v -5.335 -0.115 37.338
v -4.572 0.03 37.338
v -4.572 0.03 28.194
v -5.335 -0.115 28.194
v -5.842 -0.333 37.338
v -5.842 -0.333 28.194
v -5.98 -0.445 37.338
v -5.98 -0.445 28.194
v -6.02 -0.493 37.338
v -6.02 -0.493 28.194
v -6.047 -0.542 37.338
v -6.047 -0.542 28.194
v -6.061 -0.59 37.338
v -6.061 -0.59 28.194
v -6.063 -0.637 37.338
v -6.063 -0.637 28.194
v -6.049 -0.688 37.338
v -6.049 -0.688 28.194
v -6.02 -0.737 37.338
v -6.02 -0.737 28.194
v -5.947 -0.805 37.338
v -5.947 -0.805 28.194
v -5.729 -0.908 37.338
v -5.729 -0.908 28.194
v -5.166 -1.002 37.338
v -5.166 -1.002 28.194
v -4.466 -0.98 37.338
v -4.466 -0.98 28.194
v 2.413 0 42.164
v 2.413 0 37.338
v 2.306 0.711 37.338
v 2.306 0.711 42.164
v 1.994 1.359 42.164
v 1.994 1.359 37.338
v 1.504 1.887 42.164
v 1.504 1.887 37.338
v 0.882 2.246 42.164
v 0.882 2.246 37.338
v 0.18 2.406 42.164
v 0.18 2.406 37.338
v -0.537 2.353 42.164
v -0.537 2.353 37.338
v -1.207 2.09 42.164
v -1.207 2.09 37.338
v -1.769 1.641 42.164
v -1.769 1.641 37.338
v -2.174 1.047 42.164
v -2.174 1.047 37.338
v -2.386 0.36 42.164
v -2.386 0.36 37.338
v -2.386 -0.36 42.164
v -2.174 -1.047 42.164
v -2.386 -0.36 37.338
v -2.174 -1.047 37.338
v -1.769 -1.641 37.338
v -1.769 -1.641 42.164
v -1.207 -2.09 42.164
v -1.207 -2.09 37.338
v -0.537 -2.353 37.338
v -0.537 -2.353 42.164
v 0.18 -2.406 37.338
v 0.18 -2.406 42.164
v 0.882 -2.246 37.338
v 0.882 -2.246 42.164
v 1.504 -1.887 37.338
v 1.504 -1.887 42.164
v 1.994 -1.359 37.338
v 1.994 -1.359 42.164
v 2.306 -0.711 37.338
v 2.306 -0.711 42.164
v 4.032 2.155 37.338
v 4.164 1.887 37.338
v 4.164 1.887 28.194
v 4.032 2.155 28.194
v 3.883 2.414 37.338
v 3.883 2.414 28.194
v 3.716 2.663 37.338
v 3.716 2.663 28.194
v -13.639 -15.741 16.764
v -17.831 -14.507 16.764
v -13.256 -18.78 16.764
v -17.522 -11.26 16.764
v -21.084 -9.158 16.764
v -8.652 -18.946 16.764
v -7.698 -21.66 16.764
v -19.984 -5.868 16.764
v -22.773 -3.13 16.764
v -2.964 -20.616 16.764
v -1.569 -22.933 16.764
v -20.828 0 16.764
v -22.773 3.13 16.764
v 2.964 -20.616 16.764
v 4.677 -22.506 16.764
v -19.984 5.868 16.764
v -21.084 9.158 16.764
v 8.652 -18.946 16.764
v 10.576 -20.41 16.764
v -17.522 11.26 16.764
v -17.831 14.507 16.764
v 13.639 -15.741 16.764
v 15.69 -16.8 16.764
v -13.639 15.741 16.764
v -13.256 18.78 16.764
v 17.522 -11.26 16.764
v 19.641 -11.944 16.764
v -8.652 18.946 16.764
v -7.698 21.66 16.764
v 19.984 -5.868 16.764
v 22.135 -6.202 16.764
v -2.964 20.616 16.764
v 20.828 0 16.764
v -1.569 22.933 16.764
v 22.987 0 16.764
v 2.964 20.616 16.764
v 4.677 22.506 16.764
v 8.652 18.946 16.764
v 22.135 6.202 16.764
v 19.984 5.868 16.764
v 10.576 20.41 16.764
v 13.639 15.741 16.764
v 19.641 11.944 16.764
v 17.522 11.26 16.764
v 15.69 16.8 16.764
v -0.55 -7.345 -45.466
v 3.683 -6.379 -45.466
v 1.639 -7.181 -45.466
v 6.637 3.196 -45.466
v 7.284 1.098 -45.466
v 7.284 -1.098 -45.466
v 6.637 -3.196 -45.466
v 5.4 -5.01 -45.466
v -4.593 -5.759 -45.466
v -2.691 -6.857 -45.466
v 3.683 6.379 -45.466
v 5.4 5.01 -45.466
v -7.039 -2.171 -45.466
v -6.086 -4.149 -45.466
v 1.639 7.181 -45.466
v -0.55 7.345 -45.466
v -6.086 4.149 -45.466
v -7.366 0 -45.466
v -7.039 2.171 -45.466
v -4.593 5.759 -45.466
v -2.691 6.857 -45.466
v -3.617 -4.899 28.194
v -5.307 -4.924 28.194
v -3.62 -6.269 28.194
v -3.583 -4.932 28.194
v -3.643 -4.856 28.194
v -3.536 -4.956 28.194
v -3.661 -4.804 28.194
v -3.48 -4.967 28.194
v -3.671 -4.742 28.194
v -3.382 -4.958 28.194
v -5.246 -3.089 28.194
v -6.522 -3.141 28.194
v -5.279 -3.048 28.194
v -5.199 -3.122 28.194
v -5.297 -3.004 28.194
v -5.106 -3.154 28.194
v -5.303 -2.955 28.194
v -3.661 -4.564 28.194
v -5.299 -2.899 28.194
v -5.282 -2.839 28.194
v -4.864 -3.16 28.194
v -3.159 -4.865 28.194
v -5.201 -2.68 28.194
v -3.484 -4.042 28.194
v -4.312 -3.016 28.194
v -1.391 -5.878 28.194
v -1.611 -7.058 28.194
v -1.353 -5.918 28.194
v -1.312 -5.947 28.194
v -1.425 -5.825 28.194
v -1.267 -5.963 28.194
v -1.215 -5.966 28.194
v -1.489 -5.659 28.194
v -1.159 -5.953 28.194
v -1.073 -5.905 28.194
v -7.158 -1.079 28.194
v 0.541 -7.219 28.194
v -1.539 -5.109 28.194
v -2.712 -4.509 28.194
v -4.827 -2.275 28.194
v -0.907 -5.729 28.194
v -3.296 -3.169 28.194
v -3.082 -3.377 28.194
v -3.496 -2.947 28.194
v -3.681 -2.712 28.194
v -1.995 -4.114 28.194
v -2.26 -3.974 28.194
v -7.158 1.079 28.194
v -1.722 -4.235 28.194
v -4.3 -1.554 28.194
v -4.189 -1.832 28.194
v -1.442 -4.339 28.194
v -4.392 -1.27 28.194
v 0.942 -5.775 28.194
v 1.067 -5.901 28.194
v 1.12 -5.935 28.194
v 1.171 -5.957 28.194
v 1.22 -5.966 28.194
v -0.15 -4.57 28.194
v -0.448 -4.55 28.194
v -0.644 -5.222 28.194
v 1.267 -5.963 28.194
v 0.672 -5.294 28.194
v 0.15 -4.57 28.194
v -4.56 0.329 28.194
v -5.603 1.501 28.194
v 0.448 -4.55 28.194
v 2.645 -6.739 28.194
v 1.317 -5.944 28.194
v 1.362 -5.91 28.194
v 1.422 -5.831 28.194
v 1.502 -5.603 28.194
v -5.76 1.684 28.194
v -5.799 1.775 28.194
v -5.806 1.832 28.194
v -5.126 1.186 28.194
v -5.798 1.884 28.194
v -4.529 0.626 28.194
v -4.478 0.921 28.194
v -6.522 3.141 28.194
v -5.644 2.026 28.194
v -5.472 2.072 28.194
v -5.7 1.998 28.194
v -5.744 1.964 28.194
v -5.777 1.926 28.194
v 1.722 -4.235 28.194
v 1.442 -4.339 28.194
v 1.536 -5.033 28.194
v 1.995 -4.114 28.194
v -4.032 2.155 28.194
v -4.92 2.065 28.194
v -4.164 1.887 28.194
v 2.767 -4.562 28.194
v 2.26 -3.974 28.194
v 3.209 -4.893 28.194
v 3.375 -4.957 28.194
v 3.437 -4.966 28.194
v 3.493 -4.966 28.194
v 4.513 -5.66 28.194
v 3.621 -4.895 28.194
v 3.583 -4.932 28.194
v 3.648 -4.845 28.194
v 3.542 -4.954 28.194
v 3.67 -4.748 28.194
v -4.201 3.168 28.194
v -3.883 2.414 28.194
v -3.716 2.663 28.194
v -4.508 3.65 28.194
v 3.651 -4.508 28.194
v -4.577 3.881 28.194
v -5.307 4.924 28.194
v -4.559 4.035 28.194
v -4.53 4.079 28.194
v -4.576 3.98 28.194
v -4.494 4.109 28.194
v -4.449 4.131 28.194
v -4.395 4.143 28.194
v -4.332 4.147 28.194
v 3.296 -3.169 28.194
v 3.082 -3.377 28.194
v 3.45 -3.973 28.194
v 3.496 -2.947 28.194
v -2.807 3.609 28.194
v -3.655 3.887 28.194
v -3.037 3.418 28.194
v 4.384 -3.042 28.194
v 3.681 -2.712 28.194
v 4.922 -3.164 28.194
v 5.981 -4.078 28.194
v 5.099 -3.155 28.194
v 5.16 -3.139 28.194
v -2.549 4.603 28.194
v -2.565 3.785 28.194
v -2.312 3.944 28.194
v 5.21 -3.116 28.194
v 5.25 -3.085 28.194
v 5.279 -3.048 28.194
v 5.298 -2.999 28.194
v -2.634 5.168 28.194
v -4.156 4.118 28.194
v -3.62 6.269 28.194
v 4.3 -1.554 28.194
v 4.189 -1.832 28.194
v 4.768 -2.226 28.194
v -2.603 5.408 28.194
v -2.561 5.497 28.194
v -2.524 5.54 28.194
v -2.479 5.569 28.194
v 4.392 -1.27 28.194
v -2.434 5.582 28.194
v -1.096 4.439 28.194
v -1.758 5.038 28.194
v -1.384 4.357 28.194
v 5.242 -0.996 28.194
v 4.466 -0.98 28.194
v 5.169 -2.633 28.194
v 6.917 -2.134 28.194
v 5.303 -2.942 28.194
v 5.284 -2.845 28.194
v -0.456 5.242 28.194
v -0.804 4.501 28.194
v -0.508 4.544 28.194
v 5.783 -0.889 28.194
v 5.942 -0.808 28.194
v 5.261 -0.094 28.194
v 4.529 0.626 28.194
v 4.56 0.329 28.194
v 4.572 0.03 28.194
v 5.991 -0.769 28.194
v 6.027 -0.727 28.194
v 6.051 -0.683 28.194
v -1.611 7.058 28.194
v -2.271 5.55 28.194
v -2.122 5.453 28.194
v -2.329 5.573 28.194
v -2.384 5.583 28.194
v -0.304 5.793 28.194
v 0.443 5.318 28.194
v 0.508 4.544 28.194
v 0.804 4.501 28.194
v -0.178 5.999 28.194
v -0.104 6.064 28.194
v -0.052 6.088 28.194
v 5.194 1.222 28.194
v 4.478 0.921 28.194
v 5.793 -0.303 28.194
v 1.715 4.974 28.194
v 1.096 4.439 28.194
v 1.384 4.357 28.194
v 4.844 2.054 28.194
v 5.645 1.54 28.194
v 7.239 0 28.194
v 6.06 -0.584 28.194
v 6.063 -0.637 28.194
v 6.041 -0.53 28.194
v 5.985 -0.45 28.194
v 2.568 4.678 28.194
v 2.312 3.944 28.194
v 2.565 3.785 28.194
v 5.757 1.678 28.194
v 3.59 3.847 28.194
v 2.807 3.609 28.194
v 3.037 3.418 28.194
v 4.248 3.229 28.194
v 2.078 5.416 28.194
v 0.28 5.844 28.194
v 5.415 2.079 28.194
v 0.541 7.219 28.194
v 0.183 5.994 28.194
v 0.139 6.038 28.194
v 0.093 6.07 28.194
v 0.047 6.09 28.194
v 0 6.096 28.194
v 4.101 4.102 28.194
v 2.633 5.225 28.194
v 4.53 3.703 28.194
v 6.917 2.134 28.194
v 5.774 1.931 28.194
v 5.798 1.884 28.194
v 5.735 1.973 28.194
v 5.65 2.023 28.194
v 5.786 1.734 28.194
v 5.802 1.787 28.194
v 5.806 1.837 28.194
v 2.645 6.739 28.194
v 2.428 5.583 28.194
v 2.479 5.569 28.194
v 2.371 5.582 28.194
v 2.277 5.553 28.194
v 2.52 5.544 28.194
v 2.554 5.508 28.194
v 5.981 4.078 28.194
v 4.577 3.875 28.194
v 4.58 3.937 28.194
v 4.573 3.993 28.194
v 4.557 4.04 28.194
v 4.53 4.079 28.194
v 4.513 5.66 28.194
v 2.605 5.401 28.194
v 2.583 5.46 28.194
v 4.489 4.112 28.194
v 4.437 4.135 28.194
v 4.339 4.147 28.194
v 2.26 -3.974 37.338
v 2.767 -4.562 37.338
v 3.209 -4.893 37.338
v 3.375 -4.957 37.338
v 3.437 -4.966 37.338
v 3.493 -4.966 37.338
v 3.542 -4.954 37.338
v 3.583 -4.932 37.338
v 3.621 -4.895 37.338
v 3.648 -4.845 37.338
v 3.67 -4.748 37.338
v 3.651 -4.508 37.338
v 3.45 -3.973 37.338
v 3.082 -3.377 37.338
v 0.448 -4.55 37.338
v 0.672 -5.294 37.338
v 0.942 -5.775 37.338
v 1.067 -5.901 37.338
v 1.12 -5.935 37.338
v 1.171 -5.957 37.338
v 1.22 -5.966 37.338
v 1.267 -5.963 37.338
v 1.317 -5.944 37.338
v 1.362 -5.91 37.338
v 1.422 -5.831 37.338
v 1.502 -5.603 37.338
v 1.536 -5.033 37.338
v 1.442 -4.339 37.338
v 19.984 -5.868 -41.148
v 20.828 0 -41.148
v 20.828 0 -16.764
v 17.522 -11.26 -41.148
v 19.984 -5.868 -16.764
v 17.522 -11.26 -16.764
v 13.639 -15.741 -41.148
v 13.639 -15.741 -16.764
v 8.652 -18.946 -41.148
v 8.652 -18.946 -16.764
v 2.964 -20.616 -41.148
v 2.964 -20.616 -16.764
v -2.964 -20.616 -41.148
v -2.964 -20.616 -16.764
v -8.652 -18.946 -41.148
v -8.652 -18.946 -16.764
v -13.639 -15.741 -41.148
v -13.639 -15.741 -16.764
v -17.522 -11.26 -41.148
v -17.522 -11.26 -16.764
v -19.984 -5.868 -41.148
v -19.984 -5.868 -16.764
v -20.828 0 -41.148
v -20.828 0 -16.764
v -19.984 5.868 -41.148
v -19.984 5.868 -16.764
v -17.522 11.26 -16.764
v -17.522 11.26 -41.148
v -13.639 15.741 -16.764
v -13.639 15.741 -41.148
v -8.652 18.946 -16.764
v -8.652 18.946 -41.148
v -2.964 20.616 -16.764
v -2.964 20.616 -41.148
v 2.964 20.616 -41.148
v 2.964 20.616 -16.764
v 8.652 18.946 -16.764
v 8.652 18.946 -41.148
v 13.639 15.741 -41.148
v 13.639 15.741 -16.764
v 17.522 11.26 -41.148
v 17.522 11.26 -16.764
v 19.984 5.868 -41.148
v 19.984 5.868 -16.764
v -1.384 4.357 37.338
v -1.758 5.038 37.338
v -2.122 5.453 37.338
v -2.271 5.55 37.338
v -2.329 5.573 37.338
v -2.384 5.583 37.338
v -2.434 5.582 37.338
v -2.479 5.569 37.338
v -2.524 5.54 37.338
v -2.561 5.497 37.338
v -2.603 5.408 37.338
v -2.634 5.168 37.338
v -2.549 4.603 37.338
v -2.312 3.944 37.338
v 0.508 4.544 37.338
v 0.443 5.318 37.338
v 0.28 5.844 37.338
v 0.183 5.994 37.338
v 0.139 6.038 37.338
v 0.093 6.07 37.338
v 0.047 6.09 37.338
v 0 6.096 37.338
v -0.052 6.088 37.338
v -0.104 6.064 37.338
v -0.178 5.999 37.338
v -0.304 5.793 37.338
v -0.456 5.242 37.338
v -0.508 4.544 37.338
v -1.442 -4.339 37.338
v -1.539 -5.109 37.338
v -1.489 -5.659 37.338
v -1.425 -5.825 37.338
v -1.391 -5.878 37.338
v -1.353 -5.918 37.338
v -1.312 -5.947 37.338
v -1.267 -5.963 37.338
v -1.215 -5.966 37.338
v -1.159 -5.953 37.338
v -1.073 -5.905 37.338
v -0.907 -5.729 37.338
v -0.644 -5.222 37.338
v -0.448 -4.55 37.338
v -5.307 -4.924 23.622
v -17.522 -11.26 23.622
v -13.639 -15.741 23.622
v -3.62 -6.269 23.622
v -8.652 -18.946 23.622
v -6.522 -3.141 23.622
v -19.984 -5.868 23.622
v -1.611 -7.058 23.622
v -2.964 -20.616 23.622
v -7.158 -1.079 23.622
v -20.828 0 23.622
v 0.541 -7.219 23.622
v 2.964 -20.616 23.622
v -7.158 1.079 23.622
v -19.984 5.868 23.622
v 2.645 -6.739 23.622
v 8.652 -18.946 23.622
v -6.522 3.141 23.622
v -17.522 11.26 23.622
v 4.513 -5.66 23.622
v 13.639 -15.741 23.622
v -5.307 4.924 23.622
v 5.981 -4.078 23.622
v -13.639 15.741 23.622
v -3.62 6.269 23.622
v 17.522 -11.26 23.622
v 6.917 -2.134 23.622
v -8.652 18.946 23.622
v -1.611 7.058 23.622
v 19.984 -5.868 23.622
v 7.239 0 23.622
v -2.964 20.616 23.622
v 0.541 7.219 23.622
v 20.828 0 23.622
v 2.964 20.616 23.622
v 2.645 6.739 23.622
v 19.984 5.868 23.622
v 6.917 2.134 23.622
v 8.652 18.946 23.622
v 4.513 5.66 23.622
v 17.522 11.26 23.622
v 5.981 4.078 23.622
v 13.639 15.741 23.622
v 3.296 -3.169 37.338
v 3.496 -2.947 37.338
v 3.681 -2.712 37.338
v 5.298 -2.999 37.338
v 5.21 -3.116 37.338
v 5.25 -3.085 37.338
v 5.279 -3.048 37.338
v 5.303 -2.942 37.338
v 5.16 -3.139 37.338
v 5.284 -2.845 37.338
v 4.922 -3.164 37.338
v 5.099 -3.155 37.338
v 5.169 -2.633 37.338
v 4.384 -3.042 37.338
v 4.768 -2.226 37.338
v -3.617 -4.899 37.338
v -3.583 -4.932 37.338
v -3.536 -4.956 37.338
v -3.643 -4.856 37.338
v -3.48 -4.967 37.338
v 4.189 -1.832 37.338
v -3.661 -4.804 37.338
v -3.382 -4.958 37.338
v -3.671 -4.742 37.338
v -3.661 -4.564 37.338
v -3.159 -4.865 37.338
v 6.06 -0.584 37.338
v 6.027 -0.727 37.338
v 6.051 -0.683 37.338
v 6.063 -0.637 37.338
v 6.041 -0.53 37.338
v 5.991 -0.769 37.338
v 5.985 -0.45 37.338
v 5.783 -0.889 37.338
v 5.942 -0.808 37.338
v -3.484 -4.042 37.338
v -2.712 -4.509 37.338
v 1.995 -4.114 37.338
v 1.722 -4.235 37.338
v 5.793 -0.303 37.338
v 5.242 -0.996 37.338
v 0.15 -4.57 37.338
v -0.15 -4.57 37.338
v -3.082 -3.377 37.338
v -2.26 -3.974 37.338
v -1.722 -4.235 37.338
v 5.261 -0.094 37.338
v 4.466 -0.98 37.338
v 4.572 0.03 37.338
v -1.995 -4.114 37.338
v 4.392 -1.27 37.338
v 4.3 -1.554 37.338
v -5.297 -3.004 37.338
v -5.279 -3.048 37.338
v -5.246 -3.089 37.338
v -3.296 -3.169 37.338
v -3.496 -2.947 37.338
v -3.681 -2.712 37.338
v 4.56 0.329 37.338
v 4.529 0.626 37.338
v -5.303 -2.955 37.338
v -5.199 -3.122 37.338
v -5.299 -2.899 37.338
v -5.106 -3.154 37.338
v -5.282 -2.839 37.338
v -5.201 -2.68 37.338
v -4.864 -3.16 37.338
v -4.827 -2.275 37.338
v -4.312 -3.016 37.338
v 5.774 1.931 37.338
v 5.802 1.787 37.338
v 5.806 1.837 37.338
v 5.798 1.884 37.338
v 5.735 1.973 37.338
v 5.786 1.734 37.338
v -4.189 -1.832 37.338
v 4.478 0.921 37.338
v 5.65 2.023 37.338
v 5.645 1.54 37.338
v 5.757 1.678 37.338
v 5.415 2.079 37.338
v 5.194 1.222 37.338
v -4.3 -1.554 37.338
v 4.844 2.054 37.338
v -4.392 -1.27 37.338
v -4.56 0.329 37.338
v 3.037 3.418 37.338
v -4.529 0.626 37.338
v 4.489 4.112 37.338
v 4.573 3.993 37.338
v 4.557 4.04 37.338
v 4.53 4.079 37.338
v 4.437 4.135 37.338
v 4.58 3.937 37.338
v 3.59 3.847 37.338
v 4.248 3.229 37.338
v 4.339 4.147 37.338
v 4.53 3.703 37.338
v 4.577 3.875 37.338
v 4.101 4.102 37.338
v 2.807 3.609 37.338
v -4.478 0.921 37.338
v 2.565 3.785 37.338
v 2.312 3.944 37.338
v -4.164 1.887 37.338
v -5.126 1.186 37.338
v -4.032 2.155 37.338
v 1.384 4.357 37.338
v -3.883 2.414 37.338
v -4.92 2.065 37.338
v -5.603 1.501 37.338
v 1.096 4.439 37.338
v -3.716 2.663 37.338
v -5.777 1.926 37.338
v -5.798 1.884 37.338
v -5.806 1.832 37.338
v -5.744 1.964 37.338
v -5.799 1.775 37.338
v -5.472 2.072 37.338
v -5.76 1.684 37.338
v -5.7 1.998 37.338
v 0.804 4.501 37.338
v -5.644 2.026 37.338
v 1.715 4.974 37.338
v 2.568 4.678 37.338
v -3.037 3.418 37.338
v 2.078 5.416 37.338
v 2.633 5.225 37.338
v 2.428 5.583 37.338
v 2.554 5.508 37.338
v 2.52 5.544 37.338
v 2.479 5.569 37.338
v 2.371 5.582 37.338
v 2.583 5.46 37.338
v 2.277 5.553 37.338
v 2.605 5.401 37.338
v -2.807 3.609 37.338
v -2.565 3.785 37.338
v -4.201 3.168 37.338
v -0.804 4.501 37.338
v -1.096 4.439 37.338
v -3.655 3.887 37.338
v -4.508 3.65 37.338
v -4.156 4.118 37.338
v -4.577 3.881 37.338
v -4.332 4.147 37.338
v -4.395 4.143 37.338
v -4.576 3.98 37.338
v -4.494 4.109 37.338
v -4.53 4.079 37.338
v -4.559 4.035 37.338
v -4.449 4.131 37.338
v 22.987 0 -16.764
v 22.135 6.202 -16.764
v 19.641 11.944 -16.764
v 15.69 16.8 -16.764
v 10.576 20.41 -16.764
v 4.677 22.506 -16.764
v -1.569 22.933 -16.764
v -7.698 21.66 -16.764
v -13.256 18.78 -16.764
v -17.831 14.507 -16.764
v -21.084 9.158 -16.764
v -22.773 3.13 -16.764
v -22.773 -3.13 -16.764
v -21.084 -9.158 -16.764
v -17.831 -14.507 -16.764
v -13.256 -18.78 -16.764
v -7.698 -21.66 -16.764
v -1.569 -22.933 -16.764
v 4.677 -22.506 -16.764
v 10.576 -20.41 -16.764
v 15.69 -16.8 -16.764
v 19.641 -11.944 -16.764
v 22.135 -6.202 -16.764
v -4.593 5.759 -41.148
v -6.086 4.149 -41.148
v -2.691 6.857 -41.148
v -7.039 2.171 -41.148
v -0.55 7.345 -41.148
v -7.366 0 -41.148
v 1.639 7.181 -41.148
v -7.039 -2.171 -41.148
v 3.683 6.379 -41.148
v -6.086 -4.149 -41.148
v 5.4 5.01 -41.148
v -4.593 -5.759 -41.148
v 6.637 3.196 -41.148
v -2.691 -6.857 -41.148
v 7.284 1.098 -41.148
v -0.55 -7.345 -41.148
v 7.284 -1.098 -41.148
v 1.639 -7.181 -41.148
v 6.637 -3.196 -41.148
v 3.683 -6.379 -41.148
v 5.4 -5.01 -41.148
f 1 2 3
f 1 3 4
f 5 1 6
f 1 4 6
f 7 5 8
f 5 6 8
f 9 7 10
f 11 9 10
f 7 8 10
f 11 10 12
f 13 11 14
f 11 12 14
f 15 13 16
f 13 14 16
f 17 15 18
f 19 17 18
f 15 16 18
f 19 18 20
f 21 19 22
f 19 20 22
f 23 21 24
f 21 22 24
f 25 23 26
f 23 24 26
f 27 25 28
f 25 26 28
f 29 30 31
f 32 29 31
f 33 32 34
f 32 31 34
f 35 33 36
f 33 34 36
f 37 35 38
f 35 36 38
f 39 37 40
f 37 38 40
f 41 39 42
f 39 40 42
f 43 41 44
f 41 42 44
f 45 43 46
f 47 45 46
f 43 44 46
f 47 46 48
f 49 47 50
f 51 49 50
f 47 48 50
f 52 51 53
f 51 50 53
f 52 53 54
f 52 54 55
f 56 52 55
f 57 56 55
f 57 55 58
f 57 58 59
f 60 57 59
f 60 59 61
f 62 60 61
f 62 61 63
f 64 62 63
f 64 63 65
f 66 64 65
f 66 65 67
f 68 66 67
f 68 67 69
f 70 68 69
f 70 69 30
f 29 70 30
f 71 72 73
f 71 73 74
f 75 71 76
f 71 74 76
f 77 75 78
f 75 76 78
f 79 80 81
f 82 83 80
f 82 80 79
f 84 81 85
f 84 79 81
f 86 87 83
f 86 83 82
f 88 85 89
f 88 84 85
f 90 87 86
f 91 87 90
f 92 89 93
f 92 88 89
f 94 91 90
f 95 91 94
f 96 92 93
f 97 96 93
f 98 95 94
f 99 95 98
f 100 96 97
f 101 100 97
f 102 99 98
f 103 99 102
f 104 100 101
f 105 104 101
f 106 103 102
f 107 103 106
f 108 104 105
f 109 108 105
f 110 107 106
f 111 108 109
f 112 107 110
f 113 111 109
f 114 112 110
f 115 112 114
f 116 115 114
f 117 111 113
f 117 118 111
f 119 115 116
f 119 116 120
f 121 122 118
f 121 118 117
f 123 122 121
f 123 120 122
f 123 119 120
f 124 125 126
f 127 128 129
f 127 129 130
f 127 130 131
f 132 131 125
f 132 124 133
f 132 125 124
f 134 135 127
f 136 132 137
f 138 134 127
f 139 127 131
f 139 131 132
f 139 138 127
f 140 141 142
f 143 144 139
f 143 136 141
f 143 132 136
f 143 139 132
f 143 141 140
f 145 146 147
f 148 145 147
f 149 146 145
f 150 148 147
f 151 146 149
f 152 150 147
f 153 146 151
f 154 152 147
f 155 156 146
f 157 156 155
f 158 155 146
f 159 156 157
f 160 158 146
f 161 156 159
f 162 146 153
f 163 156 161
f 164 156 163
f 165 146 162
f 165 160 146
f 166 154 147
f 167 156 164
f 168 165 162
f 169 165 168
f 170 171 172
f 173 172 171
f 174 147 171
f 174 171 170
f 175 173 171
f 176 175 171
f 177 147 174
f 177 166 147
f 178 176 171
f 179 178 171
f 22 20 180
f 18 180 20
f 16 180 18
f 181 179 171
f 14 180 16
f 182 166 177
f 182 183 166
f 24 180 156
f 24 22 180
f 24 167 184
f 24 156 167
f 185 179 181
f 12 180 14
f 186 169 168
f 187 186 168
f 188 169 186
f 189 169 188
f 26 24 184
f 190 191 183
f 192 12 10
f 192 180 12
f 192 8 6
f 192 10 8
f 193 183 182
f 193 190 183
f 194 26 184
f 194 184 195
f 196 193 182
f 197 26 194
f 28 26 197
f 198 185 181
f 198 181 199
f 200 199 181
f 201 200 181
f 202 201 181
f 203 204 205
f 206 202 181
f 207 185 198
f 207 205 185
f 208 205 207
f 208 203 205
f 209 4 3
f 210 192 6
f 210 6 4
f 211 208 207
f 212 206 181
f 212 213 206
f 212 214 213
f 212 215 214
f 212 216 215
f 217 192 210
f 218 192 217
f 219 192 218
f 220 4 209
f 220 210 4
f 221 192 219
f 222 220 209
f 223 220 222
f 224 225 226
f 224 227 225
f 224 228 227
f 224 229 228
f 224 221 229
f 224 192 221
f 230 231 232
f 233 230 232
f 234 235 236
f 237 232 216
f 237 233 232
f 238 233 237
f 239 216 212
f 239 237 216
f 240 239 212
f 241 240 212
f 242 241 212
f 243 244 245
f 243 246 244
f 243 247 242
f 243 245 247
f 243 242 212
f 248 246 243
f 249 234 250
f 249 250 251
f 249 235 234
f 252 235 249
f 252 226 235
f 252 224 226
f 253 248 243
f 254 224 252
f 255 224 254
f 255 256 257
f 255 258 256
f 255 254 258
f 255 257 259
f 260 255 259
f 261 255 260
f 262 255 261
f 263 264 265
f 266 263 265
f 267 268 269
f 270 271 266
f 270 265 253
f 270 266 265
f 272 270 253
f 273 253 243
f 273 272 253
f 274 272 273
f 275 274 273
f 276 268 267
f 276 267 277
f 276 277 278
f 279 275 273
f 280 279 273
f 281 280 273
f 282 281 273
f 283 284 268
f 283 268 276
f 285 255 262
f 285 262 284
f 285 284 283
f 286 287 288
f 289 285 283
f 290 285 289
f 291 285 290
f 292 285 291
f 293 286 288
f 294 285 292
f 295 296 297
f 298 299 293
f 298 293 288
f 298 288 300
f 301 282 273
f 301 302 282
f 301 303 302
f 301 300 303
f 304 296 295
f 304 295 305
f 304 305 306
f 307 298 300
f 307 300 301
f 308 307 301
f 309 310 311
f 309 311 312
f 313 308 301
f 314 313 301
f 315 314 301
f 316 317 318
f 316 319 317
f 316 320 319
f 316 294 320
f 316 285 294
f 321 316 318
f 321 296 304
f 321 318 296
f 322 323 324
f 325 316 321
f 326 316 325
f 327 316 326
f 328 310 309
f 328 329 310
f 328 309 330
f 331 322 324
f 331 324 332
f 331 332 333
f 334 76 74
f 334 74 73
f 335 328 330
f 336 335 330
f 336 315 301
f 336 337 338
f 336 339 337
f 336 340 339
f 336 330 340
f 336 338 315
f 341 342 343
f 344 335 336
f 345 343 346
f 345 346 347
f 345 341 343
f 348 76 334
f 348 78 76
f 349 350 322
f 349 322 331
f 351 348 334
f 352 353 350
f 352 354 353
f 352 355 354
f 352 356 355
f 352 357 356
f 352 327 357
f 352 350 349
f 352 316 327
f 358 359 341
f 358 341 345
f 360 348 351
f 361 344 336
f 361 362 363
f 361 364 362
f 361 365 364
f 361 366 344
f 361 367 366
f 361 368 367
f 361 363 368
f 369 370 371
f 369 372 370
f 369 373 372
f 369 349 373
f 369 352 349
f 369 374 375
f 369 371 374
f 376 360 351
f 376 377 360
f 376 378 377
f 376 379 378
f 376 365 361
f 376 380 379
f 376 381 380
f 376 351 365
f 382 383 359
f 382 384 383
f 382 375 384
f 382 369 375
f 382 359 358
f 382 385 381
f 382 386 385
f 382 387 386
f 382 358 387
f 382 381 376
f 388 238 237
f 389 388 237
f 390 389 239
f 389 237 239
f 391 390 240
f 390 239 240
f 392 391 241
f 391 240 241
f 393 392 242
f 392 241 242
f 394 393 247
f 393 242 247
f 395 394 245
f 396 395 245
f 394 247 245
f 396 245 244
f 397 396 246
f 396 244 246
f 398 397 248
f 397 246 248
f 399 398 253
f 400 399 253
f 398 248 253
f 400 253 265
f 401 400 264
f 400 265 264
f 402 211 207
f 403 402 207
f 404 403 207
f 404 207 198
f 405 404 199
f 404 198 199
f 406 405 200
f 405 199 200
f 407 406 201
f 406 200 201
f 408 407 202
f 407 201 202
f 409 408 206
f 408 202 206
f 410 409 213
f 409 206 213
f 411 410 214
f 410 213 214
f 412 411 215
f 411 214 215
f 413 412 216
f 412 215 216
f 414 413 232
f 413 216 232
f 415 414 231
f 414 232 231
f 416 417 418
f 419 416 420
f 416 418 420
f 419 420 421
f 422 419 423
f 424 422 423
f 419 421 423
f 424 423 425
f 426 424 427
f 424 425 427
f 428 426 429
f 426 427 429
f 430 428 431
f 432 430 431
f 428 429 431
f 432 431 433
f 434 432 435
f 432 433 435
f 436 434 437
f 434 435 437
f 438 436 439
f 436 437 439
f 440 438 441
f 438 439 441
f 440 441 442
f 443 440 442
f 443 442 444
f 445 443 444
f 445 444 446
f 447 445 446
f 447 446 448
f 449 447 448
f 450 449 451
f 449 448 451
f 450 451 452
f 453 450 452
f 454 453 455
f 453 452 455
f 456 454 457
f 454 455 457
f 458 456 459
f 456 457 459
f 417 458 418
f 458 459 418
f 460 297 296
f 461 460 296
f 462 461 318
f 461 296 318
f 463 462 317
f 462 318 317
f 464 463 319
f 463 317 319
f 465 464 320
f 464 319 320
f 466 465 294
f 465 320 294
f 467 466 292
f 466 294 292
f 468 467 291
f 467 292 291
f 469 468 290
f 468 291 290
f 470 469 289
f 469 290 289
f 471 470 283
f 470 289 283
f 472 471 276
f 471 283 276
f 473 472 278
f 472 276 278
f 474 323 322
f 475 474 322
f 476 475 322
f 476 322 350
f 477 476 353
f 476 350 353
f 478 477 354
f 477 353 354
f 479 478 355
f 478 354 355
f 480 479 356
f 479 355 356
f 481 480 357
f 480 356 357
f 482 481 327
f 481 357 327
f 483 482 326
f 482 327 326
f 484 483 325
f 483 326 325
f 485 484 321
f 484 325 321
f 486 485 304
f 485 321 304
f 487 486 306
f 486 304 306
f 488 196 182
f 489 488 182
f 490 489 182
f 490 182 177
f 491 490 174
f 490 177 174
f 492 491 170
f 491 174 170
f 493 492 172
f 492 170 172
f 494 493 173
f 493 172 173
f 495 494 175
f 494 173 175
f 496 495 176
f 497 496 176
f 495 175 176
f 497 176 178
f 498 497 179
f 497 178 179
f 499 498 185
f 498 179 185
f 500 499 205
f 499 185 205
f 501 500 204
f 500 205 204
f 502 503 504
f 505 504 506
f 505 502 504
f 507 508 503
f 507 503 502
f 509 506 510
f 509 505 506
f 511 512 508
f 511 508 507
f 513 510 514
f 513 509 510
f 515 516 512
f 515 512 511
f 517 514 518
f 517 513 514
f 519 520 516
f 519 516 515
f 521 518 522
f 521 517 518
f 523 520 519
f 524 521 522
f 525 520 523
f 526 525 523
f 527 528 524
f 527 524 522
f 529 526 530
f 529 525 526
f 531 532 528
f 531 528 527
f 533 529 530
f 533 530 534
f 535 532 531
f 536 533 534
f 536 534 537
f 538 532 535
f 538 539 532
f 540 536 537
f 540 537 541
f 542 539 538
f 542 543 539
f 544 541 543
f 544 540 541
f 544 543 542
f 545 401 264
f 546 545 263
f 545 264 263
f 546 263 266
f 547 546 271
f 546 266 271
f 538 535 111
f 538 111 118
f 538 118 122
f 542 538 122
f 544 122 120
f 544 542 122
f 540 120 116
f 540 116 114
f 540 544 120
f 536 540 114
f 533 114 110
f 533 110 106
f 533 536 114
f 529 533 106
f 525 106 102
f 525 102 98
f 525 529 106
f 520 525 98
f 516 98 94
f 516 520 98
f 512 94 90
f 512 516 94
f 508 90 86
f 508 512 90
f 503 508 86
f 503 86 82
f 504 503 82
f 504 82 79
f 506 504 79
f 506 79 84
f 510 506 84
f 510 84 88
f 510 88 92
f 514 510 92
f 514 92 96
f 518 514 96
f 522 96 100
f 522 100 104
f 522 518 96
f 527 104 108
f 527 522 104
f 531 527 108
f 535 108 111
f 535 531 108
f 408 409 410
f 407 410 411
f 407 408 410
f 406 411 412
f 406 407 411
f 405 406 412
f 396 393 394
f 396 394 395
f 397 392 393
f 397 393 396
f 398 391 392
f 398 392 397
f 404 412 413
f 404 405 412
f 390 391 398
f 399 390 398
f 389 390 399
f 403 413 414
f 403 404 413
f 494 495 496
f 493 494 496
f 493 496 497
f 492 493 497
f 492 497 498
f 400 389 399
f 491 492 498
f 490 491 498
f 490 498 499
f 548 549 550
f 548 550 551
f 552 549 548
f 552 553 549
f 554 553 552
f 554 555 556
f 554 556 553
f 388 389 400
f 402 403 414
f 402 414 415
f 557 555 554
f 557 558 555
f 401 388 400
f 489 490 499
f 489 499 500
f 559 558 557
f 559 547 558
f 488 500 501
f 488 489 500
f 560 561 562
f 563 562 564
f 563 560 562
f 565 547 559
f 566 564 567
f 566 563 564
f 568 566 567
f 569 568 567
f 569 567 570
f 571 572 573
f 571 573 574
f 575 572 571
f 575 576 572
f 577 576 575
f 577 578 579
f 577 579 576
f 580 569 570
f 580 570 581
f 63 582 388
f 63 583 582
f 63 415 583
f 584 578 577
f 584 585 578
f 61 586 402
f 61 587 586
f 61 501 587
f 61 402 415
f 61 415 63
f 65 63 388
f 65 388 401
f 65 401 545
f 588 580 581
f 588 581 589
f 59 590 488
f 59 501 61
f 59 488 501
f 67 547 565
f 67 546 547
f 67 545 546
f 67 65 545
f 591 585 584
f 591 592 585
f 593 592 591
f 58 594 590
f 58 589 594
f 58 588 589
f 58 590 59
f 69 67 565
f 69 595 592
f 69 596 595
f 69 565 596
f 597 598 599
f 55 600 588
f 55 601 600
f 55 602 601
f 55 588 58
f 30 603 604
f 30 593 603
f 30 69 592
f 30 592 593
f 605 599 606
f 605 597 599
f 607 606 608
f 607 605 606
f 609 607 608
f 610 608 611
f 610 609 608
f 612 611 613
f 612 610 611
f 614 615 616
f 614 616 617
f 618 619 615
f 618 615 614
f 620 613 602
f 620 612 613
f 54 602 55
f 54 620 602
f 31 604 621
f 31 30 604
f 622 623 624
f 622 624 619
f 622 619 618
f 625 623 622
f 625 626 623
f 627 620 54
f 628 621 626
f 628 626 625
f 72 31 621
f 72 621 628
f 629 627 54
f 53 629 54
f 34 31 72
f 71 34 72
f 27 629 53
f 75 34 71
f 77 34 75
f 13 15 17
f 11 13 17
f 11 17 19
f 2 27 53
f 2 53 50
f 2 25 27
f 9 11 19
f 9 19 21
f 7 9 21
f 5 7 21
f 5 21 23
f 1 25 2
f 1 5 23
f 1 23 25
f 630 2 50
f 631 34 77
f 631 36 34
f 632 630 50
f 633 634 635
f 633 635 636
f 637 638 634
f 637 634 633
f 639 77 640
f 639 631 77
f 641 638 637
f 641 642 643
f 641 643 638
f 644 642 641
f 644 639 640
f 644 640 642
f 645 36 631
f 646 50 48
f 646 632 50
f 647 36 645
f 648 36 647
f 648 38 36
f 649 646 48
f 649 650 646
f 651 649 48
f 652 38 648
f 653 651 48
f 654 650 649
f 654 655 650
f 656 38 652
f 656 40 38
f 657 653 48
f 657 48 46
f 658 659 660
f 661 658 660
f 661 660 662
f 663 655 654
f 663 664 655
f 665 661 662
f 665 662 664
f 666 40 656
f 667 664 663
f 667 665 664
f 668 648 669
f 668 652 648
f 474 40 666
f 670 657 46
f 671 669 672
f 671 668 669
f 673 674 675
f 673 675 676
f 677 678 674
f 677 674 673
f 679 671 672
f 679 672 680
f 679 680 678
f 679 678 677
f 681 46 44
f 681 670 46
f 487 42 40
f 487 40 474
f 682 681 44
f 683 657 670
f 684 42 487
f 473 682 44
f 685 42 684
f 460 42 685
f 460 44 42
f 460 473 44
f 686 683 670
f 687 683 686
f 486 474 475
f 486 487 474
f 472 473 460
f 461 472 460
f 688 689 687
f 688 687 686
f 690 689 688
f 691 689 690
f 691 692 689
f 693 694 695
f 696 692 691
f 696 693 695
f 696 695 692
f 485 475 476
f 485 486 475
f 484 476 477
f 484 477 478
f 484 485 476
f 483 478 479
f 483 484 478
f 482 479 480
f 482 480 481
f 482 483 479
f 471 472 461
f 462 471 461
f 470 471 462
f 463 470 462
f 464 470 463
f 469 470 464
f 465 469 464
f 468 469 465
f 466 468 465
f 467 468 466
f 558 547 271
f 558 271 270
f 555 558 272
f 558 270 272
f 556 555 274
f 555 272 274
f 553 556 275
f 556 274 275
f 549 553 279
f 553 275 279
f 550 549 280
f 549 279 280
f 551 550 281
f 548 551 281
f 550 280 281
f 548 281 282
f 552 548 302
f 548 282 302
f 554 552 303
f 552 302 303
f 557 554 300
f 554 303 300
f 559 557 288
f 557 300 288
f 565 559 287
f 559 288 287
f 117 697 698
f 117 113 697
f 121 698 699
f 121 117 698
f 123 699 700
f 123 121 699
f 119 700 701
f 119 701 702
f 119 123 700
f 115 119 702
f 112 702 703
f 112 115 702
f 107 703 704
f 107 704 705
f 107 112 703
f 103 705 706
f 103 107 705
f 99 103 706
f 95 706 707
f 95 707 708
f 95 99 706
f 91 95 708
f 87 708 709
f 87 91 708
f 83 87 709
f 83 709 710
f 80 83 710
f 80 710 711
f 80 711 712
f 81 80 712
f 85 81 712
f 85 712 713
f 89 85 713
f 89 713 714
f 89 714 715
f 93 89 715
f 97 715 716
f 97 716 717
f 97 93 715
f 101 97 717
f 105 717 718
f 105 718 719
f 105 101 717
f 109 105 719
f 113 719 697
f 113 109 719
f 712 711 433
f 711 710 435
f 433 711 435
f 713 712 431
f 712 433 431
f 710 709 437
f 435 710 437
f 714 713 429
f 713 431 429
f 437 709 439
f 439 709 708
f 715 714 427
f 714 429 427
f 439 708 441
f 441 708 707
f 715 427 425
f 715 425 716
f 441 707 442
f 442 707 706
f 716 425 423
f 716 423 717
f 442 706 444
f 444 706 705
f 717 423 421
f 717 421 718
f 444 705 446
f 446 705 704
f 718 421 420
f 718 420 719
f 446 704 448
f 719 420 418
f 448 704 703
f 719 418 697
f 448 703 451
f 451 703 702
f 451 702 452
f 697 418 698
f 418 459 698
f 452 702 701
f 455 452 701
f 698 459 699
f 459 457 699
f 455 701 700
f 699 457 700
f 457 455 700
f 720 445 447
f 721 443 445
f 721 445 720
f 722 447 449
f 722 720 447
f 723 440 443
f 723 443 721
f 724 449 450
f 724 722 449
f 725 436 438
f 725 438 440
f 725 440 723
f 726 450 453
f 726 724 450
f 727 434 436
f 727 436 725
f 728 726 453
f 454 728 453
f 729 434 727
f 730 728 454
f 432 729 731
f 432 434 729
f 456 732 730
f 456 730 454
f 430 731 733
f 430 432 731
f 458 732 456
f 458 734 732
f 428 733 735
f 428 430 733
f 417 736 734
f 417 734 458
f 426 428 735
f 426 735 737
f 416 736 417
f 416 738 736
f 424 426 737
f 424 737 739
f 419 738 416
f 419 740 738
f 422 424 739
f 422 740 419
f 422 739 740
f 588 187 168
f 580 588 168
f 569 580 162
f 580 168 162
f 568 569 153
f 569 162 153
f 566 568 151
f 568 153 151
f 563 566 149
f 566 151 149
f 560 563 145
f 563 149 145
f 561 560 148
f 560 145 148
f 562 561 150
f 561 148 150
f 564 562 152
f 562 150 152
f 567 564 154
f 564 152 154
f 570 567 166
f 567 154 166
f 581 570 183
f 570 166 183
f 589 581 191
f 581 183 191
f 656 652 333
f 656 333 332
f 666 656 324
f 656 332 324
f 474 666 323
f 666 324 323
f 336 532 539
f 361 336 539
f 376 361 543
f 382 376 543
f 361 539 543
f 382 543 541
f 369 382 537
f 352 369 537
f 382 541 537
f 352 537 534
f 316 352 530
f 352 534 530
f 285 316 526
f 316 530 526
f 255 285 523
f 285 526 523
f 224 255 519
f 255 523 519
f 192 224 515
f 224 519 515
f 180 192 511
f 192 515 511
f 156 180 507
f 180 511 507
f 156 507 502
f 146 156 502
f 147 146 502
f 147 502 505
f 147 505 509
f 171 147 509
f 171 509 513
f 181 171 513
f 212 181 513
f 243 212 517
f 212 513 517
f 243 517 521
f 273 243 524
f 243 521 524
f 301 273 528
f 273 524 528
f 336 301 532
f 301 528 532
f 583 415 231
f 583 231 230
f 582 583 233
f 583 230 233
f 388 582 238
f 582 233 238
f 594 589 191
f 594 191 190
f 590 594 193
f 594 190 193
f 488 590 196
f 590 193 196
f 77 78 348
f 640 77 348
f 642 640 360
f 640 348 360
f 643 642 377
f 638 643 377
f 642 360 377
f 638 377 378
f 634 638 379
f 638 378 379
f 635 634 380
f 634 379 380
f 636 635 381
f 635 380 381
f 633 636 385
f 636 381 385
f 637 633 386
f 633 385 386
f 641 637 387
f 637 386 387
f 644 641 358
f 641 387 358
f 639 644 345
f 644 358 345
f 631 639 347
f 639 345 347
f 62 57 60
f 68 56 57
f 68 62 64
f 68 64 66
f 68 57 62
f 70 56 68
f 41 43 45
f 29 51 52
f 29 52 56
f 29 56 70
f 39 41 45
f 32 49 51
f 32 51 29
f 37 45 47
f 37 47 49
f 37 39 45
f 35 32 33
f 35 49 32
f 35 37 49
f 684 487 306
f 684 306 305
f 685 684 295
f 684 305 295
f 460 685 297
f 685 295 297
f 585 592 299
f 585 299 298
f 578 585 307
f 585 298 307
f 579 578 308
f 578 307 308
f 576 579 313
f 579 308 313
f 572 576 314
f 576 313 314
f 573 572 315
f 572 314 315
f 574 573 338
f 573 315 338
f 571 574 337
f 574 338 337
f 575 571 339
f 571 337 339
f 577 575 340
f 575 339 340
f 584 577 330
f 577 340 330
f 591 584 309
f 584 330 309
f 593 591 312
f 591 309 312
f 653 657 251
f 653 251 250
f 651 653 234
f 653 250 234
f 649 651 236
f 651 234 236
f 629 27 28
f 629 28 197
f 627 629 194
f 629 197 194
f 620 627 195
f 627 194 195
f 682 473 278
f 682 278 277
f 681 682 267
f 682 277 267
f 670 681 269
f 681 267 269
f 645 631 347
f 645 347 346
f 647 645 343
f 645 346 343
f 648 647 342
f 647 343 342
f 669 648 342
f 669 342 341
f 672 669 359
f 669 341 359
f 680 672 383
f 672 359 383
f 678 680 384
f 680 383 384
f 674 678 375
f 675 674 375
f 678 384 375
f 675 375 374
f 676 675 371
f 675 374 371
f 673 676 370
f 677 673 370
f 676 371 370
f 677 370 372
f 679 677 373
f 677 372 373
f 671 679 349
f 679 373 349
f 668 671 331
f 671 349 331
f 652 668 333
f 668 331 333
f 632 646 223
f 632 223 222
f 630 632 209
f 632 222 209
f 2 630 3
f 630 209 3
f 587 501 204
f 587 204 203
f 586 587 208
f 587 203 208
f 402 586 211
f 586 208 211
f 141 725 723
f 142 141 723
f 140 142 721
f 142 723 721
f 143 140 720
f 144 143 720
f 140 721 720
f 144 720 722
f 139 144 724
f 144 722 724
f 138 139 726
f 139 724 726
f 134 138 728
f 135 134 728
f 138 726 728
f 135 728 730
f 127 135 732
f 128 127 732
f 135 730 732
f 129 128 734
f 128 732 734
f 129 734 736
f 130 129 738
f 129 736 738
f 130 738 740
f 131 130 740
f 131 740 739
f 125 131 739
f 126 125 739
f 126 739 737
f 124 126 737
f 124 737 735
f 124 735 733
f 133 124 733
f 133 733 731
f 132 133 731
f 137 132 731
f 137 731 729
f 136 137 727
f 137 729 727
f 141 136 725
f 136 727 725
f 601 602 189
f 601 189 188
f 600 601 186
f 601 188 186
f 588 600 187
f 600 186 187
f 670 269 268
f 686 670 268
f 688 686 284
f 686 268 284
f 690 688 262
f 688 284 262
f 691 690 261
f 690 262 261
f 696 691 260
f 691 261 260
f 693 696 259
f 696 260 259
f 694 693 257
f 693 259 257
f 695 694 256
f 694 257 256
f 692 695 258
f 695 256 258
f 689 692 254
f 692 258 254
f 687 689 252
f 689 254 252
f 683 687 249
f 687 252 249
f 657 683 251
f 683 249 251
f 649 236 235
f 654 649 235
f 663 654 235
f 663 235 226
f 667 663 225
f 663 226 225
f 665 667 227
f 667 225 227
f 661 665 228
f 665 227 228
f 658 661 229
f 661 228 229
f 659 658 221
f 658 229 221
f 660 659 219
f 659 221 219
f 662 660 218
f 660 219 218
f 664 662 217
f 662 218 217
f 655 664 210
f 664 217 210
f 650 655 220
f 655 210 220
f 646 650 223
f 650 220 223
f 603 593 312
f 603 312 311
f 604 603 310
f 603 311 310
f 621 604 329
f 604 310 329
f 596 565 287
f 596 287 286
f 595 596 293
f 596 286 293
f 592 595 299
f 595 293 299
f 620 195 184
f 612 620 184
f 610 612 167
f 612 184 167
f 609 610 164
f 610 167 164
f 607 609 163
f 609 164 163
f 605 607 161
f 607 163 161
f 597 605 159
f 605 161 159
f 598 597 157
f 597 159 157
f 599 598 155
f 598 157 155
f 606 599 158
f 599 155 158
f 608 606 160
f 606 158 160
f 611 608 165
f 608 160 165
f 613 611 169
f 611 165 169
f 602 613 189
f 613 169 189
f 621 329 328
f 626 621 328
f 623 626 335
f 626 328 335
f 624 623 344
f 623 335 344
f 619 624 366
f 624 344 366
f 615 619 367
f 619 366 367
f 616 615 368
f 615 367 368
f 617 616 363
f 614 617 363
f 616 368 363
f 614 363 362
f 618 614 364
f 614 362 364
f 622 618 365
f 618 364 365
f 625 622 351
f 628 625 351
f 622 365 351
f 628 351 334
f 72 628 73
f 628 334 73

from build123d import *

# Parameters (mm, degrees)
SKETCH1_R           = 22.987
BOSS_EXTRUDE1_DEPTH = 16.764
SKETCH2_R           = 20.828
BOSS_EXTRUDE2_DEPTH = 24.384
SKETCH3_R           = 7.366
BOSS_EXTRUDE3_DEPTH = 4.318
BOSS_EXTRUDE4_START = 6.858
SKETCH4_R           = 20.828
BOSS_EXTRUDE4_DEPTH = 6.858
SKETCH5_R           = 7.239
BOSS_EXTRUDE5_DEPTH = 4.572
SKETCH6_R           = 2.413
BOSS_EXTRUDE6_DEPTH = 13.97
SKETCH7_R           = 4.572
BOSS_EXTRUDE7_DEPTH = 9.144
SKETCH8_RX          = 1.524
SKETCH8_RY          = 0.508
BOSS_EXTRUDE8_DEPTH = 9.144
CIRPATTERN1_COUNT   = 15


with BuildPart() as part:
    # Sketch1 → Boss-Extrude1 (new, symmetric)
    with BuildSketch(Plane.XY):
        Circle(SKETCH1_R)
    extrude(amount=BOSS_EXTRUDE1_DEPTH, both=True)

    # Sketch2 → Boss-Extrude2 (add)
    with BuildSketch(Plane(origin=(0, 0, -16.764), x_dir=(-1, 0, 0), z_dir=(0, 0, -1))):
        with Locations(Location((0, 0, 0), (0, 0, 180))):
            Circle(SKETCH2_R)
    extrude(amount=BOSS_EXTRUDE2_DEPTH)

    # Sketch3 → Boss-Extrude3 (add)
    with BuildSketch(Plane(origin=(0, 0, -41.148), x_dir=(-1, 0, 0), z_dir=(0, 0, -1))):
        Circle(SKETCH3_R)
    extrude(amount=BOSS_EXTRUDE3_DEPTH)

    # Sketch4 → Boss-Extrude4 (add)
    with BuildSketch(Plane.XY.offset(16.764).offset(BOSS_EXTRUDE4_START)):
        Circle(SKETCH4_R)
    extrude(amount=-BOSS_EXTRUDE4_DEPTH)

    # Sketch5 → Boss-Extrude5 (add)
    with BuildSketch(Plane.XY.offset(23.622)):
        Circle(SKETCH5_R)
    extrude(amount=BOSS_EXTRUDE5_DEPTH)

    # Sketch6 → Boss-Extrude6 (add)
    with BuildSketch(Plane.XY.offset(28.194)):
        Circle(SKETCH6_R)
    extrude(amount=BOSS_EXTRUDE6_DEPTH)

    # Sketch7 → Boss-Extrude7 (add)
    with BuildSketch(Plane.XY.offset(28.194)):
        with Locations(Location((0, 0, 0), (0, 0, 180))):
            Circle(SKETCH7_R)
    extrude(amount=BOSS_EXTRUDE7_DEPTH)

    # Sketch8 → Boss-Extrude8 (add)
    with BuildSketch(Plane.XY.offset(28.194)):
        with Locations(Location((0, 4.572), (0, 0, 90))):
            Ellipse(SKETCH8_RX, SKETCH8_RY)
    boss_extrude8 = extrude(amount=BOSS_EXTRUDE8_DEPTH)

    # CirPattern1: Boss-Extrude8 ×15 about axis
    cirpattern1_axis = Axis((0, 0, -49.8475), (0, 0, 1))
    for i in range(1, CIRPATTERN1_COUNT):
        add(boss_extrude8.rotate(cirpattern1_axis, i * 360 / CIRPATTERN1_COUNT))


solid = part.part
